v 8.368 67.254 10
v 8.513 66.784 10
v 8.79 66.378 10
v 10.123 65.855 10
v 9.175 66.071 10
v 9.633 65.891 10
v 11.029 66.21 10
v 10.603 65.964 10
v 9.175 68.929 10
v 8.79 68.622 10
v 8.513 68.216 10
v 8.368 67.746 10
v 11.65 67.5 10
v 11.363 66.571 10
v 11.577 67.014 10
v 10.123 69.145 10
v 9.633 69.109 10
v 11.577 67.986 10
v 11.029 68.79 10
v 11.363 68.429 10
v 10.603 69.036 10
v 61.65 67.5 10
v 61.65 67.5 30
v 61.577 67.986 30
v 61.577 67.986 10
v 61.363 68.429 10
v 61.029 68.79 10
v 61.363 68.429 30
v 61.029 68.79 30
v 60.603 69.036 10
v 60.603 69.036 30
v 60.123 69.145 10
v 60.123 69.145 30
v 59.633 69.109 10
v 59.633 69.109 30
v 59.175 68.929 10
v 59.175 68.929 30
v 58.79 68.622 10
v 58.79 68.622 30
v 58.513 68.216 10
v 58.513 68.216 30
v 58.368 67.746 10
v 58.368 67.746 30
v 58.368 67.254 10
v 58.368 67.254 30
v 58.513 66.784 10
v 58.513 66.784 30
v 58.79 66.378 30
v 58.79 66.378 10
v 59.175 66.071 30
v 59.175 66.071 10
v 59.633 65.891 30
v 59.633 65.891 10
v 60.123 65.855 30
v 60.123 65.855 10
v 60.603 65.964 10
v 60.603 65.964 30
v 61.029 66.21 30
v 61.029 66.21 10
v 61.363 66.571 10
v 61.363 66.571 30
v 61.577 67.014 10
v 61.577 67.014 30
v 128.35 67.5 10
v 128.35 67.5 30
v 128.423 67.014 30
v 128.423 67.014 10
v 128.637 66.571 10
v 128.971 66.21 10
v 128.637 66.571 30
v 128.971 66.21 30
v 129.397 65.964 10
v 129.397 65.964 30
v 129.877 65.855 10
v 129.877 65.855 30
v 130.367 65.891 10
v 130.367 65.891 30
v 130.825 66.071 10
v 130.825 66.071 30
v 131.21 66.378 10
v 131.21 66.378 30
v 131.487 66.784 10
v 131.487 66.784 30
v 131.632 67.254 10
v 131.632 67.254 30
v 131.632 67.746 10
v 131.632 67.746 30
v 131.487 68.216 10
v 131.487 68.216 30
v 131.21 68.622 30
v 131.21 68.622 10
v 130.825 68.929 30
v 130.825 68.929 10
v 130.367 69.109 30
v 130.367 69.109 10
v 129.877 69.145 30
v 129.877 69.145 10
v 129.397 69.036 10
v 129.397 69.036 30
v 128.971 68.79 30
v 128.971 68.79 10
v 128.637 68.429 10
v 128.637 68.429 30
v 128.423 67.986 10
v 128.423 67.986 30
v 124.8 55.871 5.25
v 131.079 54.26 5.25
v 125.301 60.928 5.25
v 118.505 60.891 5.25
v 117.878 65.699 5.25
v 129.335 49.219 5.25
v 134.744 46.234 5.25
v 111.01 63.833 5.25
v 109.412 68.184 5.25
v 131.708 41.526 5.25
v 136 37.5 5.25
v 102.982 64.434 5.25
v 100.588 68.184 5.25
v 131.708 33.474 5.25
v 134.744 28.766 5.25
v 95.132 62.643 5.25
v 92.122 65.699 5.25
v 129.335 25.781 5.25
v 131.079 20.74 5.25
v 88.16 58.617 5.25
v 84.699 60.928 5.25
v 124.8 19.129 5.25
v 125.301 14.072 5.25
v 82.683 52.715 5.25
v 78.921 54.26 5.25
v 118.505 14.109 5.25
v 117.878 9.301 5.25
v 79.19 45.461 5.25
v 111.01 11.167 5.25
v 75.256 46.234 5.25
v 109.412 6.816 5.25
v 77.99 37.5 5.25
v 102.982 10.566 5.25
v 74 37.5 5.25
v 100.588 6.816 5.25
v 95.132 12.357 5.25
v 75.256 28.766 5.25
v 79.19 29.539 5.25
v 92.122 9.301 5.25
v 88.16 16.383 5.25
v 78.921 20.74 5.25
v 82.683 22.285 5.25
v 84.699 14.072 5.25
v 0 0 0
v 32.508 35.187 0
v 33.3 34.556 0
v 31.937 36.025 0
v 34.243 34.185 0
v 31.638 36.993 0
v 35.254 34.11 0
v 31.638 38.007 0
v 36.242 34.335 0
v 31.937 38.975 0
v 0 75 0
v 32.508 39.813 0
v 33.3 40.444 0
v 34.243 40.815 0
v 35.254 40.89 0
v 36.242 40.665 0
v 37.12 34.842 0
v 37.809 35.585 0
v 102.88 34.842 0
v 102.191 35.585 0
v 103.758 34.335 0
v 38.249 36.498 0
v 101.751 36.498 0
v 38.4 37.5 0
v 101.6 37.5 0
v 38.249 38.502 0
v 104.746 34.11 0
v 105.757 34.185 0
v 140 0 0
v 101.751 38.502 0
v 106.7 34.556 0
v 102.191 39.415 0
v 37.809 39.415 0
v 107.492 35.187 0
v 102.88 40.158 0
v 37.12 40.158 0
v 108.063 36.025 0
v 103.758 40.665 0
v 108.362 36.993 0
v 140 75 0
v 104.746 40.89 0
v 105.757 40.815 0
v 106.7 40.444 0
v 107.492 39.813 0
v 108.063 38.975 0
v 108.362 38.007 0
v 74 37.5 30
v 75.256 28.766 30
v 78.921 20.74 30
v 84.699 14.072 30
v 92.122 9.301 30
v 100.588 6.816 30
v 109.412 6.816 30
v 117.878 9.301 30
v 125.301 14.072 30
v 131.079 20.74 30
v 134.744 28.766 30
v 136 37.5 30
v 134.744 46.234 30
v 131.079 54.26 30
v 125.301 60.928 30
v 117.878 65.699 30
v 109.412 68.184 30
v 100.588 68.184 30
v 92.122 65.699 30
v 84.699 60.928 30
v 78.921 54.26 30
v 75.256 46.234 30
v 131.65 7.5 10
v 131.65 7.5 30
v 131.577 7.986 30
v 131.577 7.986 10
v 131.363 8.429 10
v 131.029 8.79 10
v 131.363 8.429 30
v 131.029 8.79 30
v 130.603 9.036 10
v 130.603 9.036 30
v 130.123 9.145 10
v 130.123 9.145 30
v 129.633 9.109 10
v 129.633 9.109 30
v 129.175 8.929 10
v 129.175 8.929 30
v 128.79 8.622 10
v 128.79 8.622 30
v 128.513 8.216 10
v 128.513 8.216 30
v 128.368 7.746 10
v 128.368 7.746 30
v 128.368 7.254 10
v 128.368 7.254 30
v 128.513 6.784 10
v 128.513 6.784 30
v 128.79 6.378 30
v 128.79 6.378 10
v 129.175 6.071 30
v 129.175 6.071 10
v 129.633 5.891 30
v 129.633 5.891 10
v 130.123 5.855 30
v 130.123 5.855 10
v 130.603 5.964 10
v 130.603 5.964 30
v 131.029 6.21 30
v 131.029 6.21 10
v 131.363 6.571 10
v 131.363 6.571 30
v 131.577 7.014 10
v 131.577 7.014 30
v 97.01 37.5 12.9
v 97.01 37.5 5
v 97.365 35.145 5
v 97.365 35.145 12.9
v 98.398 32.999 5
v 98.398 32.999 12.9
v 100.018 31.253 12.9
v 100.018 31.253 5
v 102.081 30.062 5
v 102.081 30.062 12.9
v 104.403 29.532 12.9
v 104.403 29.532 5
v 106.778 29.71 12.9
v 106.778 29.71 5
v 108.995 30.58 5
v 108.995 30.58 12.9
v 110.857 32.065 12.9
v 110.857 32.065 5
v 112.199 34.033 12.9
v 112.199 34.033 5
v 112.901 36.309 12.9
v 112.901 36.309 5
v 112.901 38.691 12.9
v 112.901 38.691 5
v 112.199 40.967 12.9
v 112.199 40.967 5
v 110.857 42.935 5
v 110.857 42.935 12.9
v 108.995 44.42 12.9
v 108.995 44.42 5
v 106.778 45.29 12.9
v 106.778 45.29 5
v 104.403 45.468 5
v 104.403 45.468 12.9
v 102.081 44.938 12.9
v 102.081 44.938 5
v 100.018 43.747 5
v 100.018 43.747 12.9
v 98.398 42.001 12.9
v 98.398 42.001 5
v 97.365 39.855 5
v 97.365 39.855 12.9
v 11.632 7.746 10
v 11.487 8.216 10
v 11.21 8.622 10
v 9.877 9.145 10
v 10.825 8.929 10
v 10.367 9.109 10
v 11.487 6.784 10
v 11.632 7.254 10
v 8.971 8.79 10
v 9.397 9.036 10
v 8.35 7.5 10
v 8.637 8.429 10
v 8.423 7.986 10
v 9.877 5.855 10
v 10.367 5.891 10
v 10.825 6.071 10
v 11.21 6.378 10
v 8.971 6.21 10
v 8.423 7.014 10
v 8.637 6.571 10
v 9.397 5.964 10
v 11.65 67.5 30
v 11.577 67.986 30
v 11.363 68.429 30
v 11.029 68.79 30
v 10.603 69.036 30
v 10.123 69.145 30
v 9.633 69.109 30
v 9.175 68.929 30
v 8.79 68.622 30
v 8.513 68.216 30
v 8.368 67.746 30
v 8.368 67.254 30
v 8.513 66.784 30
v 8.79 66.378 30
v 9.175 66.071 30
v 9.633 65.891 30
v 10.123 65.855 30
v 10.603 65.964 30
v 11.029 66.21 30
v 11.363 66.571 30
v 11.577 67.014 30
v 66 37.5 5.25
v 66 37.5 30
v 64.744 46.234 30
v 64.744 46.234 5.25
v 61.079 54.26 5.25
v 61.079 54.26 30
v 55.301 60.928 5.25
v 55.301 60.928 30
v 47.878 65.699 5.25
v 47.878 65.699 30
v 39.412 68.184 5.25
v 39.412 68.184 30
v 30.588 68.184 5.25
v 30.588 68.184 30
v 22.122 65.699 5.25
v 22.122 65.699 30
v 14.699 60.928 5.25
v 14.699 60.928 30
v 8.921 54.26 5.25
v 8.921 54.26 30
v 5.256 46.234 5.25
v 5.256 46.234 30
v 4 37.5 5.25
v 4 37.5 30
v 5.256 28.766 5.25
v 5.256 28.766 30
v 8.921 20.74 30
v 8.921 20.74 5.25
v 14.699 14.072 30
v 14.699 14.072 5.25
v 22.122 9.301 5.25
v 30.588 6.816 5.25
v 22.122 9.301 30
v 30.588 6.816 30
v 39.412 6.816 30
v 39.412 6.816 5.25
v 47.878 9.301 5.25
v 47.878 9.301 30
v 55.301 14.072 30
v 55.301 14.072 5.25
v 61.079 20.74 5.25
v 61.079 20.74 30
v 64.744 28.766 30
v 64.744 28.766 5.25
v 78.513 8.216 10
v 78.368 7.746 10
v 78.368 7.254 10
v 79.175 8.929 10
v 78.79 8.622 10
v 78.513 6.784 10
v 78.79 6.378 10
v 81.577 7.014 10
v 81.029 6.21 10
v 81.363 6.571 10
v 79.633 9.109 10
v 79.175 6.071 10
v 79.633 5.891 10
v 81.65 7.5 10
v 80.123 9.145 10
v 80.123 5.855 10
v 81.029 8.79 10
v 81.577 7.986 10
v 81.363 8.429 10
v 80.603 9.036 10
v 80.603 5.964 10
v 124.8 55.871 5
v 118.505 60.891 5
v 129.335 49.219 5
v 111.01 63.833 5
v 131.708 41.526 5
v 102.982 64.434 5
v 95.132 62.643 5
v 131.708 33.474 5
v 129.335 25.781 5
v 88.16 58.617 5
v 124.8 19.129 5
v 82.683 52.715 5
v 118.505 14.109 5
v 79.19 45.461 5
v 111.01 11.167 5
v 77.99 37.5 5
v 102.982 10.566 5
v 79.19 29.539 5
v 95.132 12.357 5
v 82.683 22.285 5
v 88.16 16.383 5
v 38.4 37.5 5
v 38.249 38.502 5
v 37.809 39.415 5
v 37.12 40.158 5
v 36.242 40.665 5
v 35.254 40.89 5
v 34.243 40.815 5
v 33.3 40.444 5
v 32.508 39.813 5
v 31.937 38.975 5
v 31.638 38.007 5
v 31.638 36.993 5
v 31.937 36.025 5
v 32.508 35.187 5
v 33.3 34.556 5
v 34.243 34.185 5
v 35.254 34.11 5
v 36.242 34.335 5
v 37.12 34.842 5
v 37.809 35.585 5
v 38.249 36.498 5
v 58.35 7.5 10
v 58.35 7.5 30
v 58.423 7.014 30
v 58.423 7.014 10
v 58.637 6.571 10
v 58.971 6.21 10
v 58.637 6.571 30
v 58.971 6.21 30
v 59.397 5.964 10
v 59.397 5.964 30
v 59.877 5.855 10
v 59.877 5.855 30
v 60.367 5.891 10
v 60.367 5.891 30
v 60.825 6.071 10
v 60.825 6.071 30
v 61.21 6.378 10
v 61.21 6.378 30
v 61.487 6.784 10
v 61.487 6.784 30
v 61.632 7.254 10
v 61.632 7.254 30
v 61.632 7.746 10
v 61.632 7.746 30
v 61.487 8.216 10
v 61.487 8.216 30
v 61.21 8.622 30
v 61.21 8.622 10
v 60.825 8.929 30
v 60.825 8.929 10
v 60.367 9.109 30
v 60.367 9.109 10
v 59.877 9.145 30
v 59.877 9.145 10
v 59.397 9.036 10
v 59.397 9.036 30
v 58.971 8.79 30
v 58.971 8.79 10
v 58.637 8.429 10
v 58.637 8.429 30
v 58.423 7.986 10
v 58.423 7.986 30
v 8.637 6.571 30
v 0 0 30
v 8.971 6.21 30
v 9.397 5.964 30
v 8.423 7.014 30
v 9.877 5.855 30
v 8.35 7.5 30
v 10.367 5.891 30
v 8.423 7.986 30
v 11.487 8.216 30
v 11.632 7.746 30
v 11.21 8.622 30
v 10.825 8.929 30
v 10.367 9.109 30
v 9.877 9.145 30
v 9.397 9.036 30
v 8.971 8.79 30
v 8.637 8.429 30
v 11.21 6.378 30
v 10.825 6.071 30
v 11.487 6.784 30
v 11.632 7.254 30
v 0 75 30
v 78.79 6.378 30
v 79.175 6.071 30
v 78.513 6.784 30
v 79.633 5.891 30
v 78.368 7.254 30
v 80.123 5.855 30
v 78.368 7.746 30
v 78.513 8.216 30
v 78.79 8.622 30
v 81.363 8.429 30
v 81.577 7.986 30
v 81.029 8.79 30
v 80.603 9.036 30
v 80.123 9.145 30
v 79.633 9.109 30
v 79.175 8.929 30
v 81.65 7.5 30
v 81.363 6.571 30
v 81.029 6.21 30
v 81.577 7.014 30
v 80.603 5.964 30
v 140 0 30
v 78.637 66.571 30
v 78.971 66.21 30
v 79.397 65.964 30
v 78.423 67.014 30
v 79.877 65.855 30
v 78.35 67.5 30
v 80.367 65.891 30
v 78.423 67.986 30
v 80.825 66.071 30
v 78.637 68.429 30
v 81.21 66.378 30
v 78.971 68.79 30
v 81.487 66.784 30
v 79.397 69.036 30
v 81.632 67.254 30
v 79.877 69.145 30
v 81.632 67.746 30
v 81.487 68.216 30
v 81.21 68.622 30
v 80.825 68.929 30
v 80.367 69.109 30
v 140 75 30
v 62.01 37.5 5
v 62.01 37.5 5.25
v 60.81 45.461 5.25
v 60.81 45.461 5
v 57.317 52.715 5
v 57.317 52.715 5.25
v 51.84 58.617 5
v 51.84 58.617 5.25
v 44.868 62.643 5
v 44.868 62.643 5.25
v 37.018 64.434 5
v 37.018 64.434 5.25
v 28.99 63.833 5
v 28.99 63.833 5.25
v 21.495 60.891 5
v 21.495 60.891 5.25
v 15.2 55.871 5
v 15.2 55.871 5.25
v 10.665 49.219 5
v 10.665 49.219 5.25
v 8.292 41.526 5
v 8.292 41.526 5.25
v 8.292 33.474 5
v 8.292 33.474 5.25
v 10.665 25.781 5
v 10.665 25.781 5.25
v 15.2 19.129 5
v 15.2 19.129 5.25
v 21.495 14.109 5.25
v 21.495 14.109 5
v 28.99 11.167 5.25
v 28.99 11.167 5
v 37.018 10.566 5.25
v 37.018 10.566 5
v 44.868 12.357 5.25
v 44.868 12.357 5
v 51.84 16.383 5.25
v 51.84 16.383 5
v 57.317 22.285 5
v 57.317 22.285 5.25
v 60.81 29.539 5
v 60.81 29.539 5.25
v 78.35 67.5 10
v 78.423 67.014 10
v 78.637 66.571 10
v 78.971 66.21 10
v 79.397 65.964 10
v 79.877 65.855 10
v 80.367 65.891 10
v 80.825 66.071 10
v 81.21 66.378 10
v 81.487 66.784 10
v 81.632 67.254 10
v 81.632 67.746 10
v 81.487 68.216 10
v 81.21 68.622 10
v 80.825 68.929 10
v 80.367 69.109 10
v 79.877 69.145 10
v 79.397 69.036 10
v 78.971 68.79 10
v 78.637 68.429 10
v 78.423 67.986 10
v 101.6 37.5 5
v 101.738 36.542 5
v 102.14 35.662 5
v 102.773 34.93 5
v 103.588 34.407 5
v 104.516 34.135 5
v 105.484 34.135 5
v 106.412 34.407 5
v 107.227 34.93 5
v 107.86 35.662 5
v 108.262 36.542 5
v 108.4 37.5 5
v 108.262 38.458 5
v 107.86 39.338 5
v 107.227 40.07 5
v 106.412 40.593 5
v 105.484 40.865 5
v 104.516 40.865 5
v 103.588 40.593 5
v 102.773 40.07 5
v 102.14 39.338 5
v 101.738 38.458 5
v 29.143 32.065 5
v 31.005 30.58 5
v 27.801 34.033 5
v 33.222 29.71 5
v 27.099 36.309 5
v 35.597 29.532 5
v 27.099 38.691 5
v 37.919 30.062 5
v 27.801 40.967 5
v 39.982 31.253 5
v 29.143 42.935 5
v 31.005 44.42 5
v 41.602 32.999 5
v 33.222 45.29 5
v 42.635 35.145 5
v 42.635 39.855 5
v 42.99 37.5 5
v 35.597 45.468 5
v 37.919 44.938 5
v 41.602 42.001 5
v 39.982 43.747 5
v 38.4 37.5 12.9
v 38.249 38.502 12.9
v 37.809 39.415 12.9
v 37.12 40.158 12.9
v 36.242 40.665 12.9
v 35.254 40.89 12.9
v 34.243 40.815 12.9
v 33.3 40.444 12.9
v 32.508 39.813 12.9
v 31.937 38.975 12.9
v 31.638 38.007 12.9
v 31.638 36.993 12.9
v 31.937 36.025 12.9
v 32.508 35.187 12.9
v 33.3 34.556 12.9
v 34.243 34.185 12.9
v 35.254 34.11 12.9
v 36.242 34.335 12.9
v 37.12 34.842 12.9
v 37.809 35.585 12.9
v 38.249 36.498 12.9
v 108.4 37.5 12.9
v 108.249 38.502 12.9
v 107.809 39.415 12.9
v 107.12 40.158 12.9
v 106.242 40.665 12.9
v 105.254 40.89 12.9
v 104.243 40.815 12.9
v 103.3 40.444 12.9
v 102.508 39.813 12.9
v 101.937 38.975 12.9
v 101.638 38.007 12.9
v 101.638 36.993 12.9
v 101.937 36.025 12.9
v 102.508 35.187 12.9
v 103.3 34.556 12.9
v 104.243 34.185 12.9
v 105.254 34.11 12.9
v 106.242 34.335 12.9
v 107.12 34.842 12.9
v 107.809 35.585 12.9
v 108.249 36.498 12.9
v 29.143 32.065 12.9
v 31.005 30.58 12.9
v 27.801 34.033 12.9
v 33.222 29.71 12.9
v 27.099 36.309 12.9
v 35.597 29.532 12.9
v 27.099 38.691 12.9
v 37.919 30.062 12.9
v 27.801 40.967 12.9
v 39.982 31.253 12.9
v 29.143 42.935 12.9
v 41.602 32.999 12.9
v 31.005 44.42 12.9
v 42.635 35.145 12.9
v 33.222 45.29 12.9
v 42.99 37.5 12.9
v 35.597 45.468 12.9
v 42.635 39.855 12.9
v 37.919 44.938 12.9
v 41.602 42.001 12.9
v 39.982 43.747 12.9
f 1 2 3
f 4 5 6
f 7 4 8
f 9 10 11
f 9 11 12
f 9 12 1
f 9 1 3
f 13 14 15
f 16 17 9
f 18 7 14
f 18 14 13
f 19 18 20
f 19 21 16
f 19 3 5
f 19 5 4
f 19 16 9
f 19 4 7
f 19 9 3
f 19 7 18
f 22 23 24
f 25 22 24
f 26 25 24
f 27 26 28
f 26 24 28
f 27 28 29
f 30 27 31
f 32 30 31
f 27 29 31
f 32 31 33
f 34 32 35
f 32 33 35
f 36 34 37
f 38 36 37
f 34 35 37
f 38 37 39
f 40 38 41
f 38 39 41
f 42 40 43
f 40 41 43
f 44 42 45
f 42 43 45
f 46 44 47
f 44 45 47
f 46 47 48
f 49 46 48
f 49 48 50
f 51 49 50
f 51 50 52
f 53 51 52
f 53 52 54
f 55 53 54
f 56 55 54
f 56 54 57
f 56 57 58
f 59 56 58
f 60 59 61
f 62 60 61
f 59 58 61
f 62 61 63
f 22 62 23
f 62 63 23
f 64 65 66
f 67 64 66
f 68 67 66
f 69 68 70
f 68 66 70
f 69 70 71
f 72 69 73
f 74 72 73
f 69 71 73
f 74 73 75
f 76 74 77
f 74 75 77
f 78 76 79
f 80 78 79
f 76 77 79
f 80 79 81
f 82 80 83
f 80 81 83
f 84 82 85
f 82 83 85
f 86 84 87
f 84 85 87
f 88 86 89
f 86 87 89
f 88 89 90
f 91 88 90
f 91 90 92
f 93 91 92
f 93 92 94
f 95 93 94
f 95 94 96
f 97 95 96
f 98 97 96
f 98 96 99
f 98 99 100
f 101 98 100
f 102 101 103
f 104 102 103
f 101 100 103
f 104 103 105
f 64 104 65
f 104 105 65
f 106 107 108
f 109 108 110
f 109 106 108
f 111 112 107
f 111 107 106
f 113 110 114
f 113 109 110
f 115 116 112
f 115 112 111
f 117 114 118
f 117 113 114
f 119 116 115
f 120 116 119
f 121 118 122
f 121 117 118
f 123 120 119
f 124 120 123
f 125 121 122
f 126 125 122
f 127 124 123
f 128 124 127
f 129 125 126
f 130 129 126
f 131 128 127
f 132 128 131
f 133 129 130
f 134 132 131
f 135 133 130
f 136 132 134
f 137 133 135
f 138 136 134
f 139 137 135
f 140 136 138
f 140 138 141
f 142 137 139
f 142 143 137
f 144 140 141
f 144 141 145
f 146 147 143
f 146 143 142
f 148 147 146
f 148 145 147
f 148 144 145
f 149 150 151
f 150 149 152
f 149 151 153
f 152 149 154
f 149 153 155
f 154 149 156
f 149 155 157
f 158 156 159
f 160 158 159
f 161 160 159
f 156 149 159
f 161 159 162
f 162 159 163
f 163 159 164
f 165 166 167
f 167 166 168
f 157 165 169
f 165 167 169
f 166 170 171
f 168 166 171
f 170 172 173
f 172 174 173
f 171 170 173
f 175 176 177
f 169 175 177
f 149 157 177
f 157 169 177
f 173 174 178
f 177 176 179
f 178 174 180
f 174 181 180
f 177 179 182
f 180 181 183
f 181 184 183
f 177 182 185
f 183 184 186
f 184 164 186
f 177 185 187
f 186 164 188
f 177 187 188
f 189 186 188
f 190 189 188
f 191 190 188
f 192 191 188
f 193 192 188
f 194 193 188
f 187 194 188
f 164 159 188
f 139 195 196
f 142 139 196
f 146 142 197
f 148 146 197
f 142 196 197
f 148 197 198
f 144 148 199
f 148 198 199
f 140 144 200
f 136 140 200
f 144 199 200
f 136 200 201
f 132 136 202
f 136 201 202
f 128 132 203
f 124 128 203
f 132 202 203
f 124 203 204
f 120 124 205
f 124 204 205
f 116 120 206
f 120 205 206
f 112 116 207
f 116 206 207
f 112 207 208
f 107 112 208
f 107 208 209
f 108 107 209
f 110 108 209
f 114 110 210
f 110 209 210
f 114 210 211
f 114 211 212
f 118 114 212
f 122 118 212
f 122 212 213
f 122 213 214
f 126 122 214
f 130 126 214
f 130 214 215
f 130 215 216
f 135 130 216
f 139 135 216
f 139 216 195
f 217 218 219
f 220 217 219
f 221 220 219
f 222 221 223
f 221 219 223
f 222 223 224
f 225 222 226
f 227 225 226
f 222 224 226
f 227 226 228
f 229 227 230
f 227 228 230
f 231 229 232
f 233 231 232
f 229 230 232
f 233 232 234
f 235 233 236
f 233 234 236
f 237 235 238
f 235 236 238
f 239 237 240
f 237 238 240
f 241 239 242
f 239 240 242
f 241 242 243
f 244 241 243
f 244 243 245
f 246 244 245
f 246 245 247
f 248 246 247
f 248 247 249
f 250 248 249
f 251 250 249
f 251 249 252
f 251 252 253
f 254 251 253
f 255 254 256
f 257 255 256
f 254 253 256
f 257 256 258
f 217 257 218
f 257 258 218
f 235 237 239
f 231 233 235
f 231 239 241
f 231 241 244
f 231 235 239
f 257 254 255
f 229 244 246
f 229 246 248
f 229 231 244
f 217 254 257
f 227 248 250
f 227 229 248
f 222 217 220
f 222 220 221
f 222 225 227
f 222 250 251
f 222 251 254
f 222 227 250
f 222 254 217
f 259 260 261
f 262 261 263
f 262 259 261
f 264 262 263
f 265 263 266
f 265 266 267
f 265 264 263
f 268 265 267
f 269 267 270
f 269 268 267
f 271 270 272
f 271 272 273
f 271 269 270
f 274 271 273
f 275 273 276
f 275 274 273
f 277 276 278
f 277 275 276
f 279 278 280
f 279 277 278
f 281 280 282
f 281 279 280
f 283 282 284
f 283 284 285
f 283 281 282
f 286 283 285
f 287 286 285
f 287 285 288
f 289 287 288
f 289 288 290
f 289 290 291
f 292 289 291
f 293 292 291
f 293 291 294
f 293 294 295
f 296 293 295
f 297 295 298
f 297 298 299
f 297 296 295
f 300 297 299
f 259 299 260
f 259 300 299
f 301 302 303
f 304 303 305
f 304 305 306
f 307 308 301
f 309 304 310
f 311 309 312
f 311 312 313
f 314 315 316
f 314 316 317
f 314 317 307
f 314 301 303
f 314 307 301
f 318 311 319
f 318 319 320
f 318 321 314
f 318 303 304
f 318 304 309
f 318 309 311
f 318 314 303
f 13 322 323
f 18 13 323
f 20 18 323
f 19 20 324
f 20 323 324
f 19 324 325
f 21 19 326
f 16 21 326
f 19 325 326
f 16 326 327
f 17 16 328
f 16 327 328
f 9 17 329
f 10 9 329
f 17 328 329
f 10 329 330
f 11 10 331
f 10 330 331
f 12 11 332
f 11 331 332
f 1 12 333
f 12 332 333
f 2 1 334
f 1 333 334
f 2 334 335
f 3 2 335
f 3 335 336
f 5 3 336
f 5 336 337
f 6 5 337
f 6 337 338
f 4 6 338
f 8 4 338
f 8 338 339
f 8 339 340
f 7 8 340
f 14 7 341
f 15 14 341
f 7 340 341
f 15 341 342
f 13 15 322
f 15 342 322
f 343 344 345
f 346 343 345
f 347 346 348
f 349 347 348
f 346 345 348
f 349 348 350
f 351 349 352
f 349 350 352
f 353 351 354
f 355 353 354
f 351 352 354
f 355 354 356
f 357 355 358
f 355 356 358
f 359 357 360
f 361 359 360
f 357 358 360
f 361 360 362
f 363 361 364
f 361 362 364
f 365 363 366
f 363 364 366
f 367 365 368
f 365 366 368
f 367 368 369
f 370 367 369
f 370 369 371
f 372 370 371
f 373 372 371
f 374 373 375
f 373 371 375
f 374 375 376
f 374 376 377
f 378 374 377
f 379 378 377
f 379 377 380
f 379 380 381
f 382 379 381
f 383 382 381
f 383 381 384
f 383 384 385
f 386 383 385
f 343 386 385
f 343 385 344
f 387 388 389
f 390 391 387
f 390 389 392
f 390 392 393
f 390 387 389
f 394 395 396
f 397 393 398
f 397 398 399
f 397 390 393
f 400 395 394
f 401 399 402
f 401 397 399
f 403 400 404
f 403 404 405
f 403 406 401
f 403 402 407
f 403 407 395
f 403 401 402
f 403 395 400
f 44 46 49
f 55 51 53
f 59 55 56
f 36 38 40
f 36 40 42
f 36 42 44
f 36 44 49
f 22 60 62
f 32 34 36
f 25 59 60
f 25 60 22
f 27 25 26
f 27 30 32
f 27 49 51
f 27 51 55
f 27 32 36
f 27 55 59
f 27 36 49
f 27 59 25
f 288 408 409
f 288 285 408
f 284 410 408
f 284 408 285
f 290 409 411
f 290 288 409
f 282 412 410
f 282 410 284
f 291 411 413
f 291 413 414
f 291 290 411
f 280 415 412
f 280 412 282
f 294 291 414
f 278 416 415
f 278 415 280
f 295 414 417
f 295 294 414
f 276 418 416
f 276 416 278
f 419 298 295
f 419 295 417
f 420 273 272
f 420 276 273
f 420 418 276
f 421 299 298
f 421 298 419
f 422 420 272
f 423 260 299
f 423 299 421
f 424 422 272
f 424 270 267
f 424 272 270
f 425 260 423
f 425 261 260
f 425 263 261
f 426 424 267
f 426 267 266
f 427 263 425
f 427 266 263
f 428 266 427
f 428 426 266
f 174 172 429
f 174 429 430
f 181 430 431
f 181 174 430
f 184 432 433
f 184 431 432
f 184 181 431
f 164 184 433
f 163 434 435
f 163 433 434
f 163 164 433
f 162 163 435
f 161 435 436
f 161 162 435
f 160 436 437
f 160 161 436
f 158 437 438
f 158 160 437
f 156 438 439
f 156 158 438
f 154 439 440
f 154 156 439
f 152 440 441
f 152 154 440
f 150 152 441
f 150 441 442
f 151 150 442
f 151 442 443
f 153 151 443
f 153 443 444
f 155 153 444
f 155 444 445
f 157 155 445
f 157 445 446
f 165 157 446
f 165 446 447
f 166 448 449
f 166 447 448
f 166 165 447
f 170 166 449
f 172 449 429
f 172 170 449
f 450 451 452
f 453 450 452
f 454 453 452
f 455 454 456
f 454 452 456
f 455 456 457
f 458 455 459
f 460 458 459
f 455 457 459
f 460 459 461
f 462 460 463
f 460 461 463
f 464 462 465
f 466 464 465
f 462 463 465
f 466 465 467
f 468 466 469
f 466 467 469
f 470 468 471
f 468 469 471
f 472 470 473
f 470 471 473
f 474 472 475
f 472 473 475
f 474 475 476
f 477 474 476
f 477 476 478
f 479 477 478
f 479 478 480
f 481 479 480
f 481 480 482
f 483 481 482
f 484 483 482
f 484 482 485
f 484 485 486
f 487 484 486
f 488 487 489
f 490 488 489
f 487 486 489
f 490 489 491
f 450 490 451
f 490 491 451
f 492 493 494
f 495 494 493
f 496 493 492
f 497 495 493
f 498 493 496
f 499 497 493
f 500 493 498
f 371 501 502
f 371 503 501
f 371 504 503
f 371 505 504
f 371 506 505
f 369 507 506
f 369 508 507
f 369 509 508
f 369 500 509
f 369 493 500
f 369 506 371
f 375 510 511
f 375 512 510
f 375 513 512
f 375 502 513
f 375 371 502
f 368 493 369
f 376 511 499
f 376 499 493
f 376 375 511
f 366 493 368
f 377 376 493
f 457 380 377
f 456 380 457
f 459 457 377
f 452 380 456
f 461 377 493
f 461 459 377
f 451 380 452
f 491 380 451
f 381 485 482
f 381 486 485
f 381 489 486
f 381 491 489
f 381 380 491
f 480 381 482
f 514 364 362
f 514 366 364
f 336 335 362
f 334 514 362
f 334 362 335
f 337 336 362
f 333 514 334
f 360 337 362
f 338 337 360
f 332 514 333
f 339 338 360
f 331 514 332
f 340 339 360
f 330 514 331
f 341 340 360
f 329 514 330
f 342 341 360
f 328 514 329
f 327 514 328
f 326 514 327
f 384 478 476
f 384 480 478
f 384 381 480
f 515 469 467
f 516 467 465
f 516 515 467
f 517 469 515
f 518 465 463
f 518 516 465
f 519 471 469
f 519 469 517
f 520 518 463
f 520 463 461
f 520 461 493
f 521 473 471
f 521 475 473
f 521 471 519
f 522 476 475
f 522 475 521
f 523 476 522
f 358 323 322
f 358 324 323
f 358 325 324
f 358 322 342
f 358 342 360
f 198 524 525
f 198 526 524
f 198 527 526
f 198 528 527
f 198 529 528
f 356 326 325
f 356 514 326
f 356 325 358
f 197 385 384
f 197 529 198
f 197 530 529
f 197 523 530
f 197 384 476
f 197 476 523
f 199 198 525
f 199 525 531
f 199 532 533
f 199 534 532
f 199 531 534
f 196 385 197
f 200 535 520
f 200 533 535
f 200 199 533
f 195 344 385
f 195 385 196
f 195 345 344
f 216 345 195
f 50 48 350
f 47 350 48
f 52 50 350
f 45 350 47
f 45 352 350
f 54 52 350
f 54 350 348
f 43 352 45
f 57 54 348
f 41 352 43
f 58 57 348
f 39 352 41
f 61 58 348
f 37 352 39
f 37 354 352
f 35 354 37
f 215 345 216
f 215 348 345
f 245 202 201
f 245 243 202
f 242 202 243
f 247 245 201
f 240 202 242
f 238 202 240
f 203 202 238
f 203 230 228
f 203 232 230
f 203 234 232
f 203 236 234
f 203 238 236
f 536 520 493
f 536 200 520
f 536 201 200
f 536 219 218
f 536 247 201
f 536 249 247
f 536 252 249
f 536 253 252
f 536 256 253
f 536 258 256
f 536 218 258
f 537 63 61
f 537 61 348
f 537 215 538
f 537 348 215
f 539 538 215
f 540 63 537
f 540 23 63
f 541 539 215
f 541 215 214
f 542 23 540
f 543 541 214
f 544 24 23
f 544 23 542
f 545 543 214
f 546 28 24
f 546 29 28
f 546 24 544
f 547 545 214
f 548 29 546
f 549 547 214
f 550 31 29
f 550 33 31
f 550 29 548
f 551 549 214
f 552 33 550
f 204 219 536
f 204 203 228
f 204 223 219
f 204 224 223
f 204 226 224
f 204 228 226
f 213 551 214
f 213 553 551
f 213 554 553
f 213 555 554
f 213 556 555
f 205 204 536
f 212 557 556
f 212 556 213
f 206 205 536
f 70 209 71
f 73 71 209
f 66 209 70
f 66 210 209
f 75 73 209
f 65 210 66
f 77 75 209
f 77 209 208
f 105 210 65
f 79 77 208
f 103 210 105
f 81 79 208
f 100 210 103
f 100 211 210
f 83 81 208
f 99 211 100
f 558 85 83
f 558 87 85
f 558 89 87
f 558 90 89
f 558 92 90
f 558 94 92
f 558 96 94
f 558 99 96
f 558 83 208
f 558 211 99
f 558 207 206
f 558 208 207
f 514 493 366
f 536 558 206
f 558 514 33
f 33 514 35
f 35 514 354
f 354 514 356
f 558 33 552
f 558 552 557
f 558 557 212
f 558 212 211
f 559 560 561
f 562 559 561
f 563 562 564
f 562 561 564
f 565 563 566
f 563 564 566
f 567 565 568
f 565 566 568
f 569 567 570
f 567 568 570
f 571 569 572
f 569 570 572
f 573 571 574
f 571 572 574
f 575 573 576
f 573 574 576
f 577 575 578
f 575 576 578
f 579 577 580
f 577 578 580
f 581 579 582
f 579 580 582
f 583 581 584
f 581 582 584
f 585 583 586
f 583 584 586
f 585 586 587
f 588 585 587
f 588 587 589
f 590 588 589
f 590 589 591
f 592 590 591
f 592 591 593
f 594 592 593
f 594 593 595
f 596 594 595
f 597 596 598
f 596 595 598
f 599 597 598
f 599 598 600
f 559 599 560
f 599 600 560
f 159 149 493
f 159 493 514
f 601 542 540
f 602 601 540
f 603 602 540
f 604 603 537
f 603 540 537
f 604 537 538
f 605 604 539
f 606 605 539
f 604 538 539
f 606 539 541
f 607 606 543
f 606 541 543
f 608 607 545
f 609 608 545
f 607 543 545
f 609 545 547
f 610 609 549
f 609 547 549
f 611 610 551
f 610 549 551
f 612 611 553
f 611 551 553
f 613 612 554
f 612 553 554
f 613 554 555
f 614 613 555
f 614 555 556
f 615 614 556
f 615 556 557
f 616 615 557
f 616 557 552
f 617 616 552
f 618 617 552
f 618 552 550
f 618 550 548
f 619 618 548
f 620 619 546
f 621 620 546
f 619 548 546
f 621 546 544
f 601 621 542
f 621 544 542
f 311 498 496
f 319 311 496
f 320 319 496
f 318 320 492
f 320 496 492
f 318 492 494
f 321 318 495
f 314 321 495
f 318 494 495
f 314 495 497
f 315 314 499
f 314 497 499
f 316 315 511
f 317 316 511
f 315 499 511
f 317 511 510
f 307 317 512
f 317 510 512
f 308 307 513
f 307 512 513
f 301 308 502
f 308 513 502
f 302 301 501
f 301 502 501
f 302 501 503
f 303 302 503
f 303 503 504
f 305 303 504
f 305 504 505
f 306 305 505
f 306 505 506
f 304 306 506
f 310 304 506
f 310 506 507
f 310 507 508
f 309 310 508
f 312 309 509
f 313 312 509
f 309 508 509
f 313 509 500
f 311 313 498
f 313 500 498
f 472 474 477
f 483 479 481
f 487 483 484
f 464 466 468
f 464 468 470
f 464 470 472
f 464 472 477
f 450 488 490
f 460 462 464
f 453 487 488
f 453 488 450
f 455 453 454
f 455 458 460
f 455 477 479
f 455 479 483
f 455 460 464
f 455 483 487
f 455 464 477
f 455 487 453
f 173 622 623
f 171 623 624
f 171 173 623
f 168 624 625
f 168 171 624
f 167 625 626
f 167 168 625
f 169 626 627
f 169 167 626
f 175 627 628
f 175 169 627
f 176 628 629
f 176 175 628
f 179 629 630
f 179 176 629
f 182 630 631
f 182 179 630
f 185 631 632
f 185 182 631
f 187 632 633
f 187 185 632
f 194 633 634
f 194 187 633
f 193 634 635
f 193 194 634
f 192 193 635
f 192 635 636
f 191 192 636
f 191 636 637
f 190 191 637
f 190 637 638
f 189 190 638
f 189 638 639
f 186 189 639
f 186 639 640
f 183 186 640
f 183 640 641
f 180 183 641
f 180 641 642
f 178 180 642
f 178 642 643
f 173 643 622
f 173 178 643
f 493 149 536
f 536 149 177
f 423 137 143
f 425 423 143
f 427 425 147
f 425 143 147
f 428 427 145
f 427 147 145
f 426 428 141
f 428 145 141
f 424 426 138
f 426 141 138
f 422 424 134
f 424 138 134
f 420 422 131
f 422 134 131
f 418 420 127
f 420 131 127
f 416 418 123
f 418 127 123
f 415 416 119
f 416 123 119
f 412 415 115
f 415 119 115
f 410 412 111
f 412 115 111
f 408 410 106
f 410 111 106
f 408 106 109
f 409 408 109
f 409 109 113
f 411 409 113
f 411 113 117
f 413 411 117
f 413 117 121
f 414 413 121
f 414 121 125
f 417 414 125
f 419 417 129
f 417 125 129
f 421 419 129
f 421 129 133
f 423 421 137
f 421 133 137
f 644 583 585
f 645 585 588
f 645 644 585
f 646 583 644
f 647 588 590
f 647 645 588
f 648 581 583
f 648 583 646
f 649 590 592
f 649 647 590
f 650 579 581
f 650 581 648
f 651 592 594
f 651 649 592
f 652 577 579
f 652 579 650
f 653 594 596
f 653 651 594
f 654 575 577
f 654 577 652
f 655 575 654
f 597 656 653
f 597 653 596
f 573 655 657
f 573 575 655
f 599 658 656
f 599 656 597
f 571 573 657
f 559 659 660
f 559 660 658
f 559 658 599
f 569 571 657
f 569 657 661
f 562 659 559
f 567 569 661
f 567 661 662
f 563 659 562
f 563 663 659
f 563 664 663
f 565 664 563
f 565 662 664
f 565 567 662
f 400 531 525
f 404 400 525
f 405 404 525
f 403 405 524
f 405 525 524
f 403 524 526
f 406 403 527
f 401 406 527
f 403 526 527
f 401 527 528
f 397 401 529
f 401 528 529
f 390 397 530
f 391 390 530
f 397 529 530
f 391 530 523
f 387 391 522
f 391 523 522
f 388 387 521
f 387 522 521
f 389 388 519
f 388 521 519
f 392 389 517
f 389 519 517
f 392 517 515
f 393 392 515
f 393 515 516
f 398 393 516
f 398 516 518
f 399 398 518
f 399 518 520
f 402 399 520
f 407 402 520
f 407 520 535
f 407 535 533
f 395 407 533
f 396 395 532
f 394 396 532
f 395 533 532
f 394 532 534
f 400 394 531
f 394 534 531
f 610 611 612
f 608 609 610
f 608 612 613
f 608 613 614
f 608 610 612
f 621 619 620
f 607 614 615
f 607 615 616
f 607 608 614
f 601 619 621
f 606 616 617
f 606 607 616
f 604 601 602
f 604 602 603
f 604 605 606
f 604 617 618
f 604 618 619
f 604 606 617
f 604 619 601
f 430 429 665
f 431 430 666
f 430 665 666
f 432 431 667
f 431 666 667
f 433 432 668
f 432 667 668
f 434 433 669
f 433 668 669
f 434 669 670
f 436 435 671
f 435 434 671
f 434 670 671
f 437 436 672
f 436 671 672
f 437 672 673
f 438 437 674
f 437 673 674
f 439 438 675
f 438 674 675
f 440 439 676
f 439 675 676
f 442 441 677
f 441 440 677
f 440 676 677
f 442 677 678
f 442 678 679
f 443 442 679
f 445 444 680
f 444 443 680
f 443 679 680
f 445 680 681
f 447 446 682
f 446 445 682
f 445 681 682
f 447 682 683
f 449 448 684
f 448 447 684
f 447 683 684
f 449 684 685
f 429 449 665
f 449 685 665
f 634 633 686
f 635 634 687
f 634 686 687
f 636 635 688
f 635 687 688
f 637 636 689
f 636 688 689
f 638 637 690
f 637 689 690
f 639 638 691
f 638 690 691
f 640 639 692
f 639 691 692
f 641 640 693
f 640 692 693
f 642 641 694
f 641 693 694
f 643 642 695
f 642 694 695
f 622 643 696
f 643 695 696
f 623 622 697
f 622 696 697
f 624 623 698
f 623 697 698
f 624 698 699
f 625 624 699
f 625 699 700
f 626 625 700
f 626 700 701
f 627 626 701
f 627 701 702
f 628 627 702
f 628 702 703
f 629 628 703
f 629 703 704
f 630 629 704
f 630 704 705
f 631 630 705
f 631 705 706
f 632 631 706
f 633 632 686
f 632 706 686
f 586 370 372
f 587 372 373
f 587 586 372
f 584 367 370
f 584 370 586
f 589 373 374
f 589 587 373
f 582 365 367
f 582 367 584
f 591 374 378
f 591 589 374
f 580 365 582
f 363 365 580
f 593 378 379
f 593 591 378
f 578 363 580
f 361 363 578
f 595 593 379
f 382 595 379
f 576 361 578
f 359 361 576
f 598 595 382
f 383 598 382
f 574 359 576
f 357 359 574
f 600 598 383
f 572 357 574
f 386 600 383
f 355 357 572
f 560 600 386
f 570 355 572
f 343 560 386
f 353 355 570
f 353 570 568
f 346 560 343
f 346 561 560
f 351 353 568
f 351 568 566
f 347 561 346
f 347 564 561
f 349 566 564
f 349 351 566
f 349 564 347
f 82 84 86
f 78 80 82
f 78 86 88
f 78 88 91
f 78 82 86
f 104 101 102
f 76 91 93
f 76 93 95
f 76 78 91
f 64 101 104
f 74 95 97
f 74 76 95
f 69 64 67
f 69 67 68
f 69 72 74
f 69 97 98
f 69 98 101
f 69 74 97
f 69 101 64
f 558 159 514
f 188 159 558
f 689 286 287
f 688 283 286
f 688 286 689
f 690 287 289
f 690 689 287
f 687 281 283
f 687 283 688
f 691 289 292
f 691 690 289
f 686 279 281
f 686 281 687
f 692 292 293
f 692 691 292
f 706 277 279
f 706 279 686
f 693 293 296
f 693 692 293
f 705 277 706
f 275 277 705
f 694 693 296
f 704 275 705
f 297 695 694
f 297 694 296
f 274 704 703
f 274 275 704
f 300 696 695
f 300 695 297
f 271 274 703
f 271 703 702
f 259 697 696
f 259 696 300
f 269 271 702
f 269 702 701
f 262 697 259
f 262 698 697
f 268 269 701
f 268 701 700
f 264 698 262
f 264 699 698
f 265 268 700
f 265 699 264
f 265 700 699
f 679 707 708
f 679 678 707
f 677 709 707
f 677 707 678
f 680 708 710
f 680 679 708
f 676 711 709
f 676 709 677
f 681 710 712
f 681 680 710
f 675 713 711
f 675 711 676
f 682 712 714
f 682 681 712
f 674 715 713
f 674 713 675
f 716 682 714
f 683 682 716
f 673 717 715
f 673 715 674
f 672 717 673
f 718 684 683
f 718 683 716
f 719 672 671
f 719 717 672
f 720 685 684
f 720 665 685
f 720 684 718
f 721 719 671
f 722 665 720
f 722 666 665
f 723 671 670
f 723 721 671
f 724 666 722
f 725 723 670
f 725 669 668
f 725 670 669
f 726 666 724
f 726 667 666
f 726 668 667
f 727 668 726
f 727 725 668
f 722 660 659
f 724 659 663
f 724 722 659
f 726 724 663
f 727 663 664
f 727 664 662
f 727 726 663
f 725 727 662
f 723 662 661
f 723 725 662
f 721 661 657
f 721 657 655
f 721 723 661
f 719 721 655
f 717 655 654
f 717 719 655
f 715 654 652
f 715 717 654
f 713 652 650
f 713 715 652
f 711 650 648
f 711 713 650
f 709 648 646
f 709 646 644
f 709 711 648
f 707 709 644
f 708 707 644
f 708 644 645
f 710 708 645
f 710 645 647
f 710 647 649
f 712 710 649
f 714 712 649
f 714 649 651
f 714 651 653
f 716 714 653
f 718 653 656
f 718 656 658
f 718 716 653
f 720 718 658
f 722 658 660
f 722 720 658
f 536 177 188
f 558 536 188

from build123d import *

# Parameters (mm, degrees)
ESQUISSE1_W                  = 140
ESQUISSE1_H                  = 75
BOSS_EXTRU_1_DEPTH           = 30
ESQUISSE2_R                  = 31
ENL_V_MAT_EXTRU_1_DEPTH      = 25
ENL_V_MAT_EXTRU_2_DEPTH      = 161.779351908
ENL_V_MAT_EXTRU_2_DEPTH_BACK = 161.779351908
ESQUISSE3_R                  = 3.4
BOSS_EXTRU_2_START           = 0.25
ESQUISSE4_R                  = 31
ESQUISSE4_R_2                = 27.01
BOSS_EXTRU_2_DEPTH           = 0.25
BOSS_EXTRU_3_START           = 7.9
ESQUISSE5_R                  = 7.99
ESQUISSE5_R_2                = 3.4
BOSS_EXTRU_3_DEPTH           = 7.9
ESQUISSE6_R                  = 1.65
ENL_V_MAT_EXTRU_3_DEPTH      = 20


with BuildPart() as part:
    # Esquisse1 → Boss.-Extru.1 (new body)
    with BuildSketch(Plane.XY):
        with Locations((70, 37.5)):
            Rectangle(ESQUISSE1_W, ESQUISSE1_H)
    extrude(amount=BOSS_EXTRU_1_DEPTH)

    # Esquisse2 → Enlèv. mat.-Extru.1 (cut)
    with BuildSketch(Plane.XY.offset(30)):
        with Locations((35, 37.5)):
            Circle(ESQUISSE2_R)
        with Locations(Location((105, 37.5, 0), (0, 0, 180))):
            Circle(ESQUISSE2_R)
    extrude(amount=-ENL_V_MAT_EXTRU_1_DEPTH, mode=Mode.SUBTRACT)

    # Esquisse3 → Enlèv. mat.-Extru.2 (cut, two sides: drawn at the far end of the back side and taken through both)
    with BuildSketch(Plane.XY.offset(5).offset(-ENL_V_MAT_EXTRU_2_DEPTH_BACK)):
        with Locations((35, 37.5)):
            Circle(ESQUISSE3_R)
        with Locations(Location((105, 37.5, 0), (0, 0, 180))):
            Circle(ESQUISSE3_R)
    extrude(amount=ENL_V_MAT_EXTRU_2_DEPTH + ENL_V_MAT_EXTRU_2_DEPTH_BACK, mode=Mode.SUBTRACT)

    # Esquisse4 → Boss.-Extru.2 (add)
    # profile 1 of 2: a face of its own
    with BuildSketch(Plane.XY.offset(5).offset(BOSS_EXTRU_2_START)):
        with Locations((35, 37.5)):
            Circle(ESQUISSE4_R)
        with Locations((35, 37.5)):
            Circle(ESQUISSE4_R_2, mode=Mode.SUBTRACT)
    # profile 2 of 2: a face of its own
    with BuildSketch(Plane.XY.offset(5).offset(BOSS_EXTRU_2_START)):
        with Locations(Location((105, 37.5, 0), (0, 0, 180))):
            Circle(ESQUISSE4_R)
        with Locations(Location((105, 37.5, 0), (0, 0, 180))):
            Circle(ESQUISSE4_R_2, mode=Mode.SUBTRACT)
    extrude(amount=-BOSS_EXTRU_2_DEPTH)

    # Esquisse5 → Boss.-Extru.3 (add)
    # profile 1 of 2: a face of its own
    with BuildSketch(Plane.XY.offset(5).offset(BOSS_EXTRU_3_START)):
        with Locations((35, 37.5)):
            Circle(ESQUISSE5_R)
        with Locations((35, 37.5)):
            Circle(ESQUISSE5_R_2, mode=Mode.SUBTRACT)
    # profile 2 of 2: a face of its own
    with BuildSketch(Plane.XY.offset(5).offset(BOSS_EXTRU_3_START)):
        with Locations(Location((105, 37.5, 0), (0, 0, 180))):
            Circle(ESQUISSE5_R)
        with Locations((105, 37.5)):
            Circle(ESQUISSE5_R_2, mode=Mode.SUBTRACT)
    extrude(amount=-BOSS_EXTRU_3_DEPTH)

    # Esquisse6 → Enlèv. mat.-Extru.3 (cut)
    with BuildSketch(Plane.XY.offset(30)):
        with Locations((60, 67.5)):
            Circle(ESQUISSE6_R)
        with Locations((10, 67.5)):
            Circle(ESQUISSE6_R)
        with Locations(Location((10, 7.5, 0), (0, 0, 180))):
            Circle(ESQUISSE6_R)
        with Locations(Location((60, 7.5, 0), (0, 0, 180))):
            Circle(ESQUISSE6_R)
        with Locations((80, 7.5)):
            Circle(ESQUISSE6_R)
        with Locations((130, 7.5)):
            Circle(ESQUISSE6_R)
        with Locations(Location((130, 67.5, 0), (0, 0, 180))):
            Circle(ESQUISSE6_R)
        with Locations(Location((80, 67.5, 0), (0, 0, 180))):
            Circle(ESQUISSE6_R)
    extrude(amount=-ENL_V_MAT_EXTRU_3_DEPTH, mode=Mode.SUBTRACT)


solid = part.part
